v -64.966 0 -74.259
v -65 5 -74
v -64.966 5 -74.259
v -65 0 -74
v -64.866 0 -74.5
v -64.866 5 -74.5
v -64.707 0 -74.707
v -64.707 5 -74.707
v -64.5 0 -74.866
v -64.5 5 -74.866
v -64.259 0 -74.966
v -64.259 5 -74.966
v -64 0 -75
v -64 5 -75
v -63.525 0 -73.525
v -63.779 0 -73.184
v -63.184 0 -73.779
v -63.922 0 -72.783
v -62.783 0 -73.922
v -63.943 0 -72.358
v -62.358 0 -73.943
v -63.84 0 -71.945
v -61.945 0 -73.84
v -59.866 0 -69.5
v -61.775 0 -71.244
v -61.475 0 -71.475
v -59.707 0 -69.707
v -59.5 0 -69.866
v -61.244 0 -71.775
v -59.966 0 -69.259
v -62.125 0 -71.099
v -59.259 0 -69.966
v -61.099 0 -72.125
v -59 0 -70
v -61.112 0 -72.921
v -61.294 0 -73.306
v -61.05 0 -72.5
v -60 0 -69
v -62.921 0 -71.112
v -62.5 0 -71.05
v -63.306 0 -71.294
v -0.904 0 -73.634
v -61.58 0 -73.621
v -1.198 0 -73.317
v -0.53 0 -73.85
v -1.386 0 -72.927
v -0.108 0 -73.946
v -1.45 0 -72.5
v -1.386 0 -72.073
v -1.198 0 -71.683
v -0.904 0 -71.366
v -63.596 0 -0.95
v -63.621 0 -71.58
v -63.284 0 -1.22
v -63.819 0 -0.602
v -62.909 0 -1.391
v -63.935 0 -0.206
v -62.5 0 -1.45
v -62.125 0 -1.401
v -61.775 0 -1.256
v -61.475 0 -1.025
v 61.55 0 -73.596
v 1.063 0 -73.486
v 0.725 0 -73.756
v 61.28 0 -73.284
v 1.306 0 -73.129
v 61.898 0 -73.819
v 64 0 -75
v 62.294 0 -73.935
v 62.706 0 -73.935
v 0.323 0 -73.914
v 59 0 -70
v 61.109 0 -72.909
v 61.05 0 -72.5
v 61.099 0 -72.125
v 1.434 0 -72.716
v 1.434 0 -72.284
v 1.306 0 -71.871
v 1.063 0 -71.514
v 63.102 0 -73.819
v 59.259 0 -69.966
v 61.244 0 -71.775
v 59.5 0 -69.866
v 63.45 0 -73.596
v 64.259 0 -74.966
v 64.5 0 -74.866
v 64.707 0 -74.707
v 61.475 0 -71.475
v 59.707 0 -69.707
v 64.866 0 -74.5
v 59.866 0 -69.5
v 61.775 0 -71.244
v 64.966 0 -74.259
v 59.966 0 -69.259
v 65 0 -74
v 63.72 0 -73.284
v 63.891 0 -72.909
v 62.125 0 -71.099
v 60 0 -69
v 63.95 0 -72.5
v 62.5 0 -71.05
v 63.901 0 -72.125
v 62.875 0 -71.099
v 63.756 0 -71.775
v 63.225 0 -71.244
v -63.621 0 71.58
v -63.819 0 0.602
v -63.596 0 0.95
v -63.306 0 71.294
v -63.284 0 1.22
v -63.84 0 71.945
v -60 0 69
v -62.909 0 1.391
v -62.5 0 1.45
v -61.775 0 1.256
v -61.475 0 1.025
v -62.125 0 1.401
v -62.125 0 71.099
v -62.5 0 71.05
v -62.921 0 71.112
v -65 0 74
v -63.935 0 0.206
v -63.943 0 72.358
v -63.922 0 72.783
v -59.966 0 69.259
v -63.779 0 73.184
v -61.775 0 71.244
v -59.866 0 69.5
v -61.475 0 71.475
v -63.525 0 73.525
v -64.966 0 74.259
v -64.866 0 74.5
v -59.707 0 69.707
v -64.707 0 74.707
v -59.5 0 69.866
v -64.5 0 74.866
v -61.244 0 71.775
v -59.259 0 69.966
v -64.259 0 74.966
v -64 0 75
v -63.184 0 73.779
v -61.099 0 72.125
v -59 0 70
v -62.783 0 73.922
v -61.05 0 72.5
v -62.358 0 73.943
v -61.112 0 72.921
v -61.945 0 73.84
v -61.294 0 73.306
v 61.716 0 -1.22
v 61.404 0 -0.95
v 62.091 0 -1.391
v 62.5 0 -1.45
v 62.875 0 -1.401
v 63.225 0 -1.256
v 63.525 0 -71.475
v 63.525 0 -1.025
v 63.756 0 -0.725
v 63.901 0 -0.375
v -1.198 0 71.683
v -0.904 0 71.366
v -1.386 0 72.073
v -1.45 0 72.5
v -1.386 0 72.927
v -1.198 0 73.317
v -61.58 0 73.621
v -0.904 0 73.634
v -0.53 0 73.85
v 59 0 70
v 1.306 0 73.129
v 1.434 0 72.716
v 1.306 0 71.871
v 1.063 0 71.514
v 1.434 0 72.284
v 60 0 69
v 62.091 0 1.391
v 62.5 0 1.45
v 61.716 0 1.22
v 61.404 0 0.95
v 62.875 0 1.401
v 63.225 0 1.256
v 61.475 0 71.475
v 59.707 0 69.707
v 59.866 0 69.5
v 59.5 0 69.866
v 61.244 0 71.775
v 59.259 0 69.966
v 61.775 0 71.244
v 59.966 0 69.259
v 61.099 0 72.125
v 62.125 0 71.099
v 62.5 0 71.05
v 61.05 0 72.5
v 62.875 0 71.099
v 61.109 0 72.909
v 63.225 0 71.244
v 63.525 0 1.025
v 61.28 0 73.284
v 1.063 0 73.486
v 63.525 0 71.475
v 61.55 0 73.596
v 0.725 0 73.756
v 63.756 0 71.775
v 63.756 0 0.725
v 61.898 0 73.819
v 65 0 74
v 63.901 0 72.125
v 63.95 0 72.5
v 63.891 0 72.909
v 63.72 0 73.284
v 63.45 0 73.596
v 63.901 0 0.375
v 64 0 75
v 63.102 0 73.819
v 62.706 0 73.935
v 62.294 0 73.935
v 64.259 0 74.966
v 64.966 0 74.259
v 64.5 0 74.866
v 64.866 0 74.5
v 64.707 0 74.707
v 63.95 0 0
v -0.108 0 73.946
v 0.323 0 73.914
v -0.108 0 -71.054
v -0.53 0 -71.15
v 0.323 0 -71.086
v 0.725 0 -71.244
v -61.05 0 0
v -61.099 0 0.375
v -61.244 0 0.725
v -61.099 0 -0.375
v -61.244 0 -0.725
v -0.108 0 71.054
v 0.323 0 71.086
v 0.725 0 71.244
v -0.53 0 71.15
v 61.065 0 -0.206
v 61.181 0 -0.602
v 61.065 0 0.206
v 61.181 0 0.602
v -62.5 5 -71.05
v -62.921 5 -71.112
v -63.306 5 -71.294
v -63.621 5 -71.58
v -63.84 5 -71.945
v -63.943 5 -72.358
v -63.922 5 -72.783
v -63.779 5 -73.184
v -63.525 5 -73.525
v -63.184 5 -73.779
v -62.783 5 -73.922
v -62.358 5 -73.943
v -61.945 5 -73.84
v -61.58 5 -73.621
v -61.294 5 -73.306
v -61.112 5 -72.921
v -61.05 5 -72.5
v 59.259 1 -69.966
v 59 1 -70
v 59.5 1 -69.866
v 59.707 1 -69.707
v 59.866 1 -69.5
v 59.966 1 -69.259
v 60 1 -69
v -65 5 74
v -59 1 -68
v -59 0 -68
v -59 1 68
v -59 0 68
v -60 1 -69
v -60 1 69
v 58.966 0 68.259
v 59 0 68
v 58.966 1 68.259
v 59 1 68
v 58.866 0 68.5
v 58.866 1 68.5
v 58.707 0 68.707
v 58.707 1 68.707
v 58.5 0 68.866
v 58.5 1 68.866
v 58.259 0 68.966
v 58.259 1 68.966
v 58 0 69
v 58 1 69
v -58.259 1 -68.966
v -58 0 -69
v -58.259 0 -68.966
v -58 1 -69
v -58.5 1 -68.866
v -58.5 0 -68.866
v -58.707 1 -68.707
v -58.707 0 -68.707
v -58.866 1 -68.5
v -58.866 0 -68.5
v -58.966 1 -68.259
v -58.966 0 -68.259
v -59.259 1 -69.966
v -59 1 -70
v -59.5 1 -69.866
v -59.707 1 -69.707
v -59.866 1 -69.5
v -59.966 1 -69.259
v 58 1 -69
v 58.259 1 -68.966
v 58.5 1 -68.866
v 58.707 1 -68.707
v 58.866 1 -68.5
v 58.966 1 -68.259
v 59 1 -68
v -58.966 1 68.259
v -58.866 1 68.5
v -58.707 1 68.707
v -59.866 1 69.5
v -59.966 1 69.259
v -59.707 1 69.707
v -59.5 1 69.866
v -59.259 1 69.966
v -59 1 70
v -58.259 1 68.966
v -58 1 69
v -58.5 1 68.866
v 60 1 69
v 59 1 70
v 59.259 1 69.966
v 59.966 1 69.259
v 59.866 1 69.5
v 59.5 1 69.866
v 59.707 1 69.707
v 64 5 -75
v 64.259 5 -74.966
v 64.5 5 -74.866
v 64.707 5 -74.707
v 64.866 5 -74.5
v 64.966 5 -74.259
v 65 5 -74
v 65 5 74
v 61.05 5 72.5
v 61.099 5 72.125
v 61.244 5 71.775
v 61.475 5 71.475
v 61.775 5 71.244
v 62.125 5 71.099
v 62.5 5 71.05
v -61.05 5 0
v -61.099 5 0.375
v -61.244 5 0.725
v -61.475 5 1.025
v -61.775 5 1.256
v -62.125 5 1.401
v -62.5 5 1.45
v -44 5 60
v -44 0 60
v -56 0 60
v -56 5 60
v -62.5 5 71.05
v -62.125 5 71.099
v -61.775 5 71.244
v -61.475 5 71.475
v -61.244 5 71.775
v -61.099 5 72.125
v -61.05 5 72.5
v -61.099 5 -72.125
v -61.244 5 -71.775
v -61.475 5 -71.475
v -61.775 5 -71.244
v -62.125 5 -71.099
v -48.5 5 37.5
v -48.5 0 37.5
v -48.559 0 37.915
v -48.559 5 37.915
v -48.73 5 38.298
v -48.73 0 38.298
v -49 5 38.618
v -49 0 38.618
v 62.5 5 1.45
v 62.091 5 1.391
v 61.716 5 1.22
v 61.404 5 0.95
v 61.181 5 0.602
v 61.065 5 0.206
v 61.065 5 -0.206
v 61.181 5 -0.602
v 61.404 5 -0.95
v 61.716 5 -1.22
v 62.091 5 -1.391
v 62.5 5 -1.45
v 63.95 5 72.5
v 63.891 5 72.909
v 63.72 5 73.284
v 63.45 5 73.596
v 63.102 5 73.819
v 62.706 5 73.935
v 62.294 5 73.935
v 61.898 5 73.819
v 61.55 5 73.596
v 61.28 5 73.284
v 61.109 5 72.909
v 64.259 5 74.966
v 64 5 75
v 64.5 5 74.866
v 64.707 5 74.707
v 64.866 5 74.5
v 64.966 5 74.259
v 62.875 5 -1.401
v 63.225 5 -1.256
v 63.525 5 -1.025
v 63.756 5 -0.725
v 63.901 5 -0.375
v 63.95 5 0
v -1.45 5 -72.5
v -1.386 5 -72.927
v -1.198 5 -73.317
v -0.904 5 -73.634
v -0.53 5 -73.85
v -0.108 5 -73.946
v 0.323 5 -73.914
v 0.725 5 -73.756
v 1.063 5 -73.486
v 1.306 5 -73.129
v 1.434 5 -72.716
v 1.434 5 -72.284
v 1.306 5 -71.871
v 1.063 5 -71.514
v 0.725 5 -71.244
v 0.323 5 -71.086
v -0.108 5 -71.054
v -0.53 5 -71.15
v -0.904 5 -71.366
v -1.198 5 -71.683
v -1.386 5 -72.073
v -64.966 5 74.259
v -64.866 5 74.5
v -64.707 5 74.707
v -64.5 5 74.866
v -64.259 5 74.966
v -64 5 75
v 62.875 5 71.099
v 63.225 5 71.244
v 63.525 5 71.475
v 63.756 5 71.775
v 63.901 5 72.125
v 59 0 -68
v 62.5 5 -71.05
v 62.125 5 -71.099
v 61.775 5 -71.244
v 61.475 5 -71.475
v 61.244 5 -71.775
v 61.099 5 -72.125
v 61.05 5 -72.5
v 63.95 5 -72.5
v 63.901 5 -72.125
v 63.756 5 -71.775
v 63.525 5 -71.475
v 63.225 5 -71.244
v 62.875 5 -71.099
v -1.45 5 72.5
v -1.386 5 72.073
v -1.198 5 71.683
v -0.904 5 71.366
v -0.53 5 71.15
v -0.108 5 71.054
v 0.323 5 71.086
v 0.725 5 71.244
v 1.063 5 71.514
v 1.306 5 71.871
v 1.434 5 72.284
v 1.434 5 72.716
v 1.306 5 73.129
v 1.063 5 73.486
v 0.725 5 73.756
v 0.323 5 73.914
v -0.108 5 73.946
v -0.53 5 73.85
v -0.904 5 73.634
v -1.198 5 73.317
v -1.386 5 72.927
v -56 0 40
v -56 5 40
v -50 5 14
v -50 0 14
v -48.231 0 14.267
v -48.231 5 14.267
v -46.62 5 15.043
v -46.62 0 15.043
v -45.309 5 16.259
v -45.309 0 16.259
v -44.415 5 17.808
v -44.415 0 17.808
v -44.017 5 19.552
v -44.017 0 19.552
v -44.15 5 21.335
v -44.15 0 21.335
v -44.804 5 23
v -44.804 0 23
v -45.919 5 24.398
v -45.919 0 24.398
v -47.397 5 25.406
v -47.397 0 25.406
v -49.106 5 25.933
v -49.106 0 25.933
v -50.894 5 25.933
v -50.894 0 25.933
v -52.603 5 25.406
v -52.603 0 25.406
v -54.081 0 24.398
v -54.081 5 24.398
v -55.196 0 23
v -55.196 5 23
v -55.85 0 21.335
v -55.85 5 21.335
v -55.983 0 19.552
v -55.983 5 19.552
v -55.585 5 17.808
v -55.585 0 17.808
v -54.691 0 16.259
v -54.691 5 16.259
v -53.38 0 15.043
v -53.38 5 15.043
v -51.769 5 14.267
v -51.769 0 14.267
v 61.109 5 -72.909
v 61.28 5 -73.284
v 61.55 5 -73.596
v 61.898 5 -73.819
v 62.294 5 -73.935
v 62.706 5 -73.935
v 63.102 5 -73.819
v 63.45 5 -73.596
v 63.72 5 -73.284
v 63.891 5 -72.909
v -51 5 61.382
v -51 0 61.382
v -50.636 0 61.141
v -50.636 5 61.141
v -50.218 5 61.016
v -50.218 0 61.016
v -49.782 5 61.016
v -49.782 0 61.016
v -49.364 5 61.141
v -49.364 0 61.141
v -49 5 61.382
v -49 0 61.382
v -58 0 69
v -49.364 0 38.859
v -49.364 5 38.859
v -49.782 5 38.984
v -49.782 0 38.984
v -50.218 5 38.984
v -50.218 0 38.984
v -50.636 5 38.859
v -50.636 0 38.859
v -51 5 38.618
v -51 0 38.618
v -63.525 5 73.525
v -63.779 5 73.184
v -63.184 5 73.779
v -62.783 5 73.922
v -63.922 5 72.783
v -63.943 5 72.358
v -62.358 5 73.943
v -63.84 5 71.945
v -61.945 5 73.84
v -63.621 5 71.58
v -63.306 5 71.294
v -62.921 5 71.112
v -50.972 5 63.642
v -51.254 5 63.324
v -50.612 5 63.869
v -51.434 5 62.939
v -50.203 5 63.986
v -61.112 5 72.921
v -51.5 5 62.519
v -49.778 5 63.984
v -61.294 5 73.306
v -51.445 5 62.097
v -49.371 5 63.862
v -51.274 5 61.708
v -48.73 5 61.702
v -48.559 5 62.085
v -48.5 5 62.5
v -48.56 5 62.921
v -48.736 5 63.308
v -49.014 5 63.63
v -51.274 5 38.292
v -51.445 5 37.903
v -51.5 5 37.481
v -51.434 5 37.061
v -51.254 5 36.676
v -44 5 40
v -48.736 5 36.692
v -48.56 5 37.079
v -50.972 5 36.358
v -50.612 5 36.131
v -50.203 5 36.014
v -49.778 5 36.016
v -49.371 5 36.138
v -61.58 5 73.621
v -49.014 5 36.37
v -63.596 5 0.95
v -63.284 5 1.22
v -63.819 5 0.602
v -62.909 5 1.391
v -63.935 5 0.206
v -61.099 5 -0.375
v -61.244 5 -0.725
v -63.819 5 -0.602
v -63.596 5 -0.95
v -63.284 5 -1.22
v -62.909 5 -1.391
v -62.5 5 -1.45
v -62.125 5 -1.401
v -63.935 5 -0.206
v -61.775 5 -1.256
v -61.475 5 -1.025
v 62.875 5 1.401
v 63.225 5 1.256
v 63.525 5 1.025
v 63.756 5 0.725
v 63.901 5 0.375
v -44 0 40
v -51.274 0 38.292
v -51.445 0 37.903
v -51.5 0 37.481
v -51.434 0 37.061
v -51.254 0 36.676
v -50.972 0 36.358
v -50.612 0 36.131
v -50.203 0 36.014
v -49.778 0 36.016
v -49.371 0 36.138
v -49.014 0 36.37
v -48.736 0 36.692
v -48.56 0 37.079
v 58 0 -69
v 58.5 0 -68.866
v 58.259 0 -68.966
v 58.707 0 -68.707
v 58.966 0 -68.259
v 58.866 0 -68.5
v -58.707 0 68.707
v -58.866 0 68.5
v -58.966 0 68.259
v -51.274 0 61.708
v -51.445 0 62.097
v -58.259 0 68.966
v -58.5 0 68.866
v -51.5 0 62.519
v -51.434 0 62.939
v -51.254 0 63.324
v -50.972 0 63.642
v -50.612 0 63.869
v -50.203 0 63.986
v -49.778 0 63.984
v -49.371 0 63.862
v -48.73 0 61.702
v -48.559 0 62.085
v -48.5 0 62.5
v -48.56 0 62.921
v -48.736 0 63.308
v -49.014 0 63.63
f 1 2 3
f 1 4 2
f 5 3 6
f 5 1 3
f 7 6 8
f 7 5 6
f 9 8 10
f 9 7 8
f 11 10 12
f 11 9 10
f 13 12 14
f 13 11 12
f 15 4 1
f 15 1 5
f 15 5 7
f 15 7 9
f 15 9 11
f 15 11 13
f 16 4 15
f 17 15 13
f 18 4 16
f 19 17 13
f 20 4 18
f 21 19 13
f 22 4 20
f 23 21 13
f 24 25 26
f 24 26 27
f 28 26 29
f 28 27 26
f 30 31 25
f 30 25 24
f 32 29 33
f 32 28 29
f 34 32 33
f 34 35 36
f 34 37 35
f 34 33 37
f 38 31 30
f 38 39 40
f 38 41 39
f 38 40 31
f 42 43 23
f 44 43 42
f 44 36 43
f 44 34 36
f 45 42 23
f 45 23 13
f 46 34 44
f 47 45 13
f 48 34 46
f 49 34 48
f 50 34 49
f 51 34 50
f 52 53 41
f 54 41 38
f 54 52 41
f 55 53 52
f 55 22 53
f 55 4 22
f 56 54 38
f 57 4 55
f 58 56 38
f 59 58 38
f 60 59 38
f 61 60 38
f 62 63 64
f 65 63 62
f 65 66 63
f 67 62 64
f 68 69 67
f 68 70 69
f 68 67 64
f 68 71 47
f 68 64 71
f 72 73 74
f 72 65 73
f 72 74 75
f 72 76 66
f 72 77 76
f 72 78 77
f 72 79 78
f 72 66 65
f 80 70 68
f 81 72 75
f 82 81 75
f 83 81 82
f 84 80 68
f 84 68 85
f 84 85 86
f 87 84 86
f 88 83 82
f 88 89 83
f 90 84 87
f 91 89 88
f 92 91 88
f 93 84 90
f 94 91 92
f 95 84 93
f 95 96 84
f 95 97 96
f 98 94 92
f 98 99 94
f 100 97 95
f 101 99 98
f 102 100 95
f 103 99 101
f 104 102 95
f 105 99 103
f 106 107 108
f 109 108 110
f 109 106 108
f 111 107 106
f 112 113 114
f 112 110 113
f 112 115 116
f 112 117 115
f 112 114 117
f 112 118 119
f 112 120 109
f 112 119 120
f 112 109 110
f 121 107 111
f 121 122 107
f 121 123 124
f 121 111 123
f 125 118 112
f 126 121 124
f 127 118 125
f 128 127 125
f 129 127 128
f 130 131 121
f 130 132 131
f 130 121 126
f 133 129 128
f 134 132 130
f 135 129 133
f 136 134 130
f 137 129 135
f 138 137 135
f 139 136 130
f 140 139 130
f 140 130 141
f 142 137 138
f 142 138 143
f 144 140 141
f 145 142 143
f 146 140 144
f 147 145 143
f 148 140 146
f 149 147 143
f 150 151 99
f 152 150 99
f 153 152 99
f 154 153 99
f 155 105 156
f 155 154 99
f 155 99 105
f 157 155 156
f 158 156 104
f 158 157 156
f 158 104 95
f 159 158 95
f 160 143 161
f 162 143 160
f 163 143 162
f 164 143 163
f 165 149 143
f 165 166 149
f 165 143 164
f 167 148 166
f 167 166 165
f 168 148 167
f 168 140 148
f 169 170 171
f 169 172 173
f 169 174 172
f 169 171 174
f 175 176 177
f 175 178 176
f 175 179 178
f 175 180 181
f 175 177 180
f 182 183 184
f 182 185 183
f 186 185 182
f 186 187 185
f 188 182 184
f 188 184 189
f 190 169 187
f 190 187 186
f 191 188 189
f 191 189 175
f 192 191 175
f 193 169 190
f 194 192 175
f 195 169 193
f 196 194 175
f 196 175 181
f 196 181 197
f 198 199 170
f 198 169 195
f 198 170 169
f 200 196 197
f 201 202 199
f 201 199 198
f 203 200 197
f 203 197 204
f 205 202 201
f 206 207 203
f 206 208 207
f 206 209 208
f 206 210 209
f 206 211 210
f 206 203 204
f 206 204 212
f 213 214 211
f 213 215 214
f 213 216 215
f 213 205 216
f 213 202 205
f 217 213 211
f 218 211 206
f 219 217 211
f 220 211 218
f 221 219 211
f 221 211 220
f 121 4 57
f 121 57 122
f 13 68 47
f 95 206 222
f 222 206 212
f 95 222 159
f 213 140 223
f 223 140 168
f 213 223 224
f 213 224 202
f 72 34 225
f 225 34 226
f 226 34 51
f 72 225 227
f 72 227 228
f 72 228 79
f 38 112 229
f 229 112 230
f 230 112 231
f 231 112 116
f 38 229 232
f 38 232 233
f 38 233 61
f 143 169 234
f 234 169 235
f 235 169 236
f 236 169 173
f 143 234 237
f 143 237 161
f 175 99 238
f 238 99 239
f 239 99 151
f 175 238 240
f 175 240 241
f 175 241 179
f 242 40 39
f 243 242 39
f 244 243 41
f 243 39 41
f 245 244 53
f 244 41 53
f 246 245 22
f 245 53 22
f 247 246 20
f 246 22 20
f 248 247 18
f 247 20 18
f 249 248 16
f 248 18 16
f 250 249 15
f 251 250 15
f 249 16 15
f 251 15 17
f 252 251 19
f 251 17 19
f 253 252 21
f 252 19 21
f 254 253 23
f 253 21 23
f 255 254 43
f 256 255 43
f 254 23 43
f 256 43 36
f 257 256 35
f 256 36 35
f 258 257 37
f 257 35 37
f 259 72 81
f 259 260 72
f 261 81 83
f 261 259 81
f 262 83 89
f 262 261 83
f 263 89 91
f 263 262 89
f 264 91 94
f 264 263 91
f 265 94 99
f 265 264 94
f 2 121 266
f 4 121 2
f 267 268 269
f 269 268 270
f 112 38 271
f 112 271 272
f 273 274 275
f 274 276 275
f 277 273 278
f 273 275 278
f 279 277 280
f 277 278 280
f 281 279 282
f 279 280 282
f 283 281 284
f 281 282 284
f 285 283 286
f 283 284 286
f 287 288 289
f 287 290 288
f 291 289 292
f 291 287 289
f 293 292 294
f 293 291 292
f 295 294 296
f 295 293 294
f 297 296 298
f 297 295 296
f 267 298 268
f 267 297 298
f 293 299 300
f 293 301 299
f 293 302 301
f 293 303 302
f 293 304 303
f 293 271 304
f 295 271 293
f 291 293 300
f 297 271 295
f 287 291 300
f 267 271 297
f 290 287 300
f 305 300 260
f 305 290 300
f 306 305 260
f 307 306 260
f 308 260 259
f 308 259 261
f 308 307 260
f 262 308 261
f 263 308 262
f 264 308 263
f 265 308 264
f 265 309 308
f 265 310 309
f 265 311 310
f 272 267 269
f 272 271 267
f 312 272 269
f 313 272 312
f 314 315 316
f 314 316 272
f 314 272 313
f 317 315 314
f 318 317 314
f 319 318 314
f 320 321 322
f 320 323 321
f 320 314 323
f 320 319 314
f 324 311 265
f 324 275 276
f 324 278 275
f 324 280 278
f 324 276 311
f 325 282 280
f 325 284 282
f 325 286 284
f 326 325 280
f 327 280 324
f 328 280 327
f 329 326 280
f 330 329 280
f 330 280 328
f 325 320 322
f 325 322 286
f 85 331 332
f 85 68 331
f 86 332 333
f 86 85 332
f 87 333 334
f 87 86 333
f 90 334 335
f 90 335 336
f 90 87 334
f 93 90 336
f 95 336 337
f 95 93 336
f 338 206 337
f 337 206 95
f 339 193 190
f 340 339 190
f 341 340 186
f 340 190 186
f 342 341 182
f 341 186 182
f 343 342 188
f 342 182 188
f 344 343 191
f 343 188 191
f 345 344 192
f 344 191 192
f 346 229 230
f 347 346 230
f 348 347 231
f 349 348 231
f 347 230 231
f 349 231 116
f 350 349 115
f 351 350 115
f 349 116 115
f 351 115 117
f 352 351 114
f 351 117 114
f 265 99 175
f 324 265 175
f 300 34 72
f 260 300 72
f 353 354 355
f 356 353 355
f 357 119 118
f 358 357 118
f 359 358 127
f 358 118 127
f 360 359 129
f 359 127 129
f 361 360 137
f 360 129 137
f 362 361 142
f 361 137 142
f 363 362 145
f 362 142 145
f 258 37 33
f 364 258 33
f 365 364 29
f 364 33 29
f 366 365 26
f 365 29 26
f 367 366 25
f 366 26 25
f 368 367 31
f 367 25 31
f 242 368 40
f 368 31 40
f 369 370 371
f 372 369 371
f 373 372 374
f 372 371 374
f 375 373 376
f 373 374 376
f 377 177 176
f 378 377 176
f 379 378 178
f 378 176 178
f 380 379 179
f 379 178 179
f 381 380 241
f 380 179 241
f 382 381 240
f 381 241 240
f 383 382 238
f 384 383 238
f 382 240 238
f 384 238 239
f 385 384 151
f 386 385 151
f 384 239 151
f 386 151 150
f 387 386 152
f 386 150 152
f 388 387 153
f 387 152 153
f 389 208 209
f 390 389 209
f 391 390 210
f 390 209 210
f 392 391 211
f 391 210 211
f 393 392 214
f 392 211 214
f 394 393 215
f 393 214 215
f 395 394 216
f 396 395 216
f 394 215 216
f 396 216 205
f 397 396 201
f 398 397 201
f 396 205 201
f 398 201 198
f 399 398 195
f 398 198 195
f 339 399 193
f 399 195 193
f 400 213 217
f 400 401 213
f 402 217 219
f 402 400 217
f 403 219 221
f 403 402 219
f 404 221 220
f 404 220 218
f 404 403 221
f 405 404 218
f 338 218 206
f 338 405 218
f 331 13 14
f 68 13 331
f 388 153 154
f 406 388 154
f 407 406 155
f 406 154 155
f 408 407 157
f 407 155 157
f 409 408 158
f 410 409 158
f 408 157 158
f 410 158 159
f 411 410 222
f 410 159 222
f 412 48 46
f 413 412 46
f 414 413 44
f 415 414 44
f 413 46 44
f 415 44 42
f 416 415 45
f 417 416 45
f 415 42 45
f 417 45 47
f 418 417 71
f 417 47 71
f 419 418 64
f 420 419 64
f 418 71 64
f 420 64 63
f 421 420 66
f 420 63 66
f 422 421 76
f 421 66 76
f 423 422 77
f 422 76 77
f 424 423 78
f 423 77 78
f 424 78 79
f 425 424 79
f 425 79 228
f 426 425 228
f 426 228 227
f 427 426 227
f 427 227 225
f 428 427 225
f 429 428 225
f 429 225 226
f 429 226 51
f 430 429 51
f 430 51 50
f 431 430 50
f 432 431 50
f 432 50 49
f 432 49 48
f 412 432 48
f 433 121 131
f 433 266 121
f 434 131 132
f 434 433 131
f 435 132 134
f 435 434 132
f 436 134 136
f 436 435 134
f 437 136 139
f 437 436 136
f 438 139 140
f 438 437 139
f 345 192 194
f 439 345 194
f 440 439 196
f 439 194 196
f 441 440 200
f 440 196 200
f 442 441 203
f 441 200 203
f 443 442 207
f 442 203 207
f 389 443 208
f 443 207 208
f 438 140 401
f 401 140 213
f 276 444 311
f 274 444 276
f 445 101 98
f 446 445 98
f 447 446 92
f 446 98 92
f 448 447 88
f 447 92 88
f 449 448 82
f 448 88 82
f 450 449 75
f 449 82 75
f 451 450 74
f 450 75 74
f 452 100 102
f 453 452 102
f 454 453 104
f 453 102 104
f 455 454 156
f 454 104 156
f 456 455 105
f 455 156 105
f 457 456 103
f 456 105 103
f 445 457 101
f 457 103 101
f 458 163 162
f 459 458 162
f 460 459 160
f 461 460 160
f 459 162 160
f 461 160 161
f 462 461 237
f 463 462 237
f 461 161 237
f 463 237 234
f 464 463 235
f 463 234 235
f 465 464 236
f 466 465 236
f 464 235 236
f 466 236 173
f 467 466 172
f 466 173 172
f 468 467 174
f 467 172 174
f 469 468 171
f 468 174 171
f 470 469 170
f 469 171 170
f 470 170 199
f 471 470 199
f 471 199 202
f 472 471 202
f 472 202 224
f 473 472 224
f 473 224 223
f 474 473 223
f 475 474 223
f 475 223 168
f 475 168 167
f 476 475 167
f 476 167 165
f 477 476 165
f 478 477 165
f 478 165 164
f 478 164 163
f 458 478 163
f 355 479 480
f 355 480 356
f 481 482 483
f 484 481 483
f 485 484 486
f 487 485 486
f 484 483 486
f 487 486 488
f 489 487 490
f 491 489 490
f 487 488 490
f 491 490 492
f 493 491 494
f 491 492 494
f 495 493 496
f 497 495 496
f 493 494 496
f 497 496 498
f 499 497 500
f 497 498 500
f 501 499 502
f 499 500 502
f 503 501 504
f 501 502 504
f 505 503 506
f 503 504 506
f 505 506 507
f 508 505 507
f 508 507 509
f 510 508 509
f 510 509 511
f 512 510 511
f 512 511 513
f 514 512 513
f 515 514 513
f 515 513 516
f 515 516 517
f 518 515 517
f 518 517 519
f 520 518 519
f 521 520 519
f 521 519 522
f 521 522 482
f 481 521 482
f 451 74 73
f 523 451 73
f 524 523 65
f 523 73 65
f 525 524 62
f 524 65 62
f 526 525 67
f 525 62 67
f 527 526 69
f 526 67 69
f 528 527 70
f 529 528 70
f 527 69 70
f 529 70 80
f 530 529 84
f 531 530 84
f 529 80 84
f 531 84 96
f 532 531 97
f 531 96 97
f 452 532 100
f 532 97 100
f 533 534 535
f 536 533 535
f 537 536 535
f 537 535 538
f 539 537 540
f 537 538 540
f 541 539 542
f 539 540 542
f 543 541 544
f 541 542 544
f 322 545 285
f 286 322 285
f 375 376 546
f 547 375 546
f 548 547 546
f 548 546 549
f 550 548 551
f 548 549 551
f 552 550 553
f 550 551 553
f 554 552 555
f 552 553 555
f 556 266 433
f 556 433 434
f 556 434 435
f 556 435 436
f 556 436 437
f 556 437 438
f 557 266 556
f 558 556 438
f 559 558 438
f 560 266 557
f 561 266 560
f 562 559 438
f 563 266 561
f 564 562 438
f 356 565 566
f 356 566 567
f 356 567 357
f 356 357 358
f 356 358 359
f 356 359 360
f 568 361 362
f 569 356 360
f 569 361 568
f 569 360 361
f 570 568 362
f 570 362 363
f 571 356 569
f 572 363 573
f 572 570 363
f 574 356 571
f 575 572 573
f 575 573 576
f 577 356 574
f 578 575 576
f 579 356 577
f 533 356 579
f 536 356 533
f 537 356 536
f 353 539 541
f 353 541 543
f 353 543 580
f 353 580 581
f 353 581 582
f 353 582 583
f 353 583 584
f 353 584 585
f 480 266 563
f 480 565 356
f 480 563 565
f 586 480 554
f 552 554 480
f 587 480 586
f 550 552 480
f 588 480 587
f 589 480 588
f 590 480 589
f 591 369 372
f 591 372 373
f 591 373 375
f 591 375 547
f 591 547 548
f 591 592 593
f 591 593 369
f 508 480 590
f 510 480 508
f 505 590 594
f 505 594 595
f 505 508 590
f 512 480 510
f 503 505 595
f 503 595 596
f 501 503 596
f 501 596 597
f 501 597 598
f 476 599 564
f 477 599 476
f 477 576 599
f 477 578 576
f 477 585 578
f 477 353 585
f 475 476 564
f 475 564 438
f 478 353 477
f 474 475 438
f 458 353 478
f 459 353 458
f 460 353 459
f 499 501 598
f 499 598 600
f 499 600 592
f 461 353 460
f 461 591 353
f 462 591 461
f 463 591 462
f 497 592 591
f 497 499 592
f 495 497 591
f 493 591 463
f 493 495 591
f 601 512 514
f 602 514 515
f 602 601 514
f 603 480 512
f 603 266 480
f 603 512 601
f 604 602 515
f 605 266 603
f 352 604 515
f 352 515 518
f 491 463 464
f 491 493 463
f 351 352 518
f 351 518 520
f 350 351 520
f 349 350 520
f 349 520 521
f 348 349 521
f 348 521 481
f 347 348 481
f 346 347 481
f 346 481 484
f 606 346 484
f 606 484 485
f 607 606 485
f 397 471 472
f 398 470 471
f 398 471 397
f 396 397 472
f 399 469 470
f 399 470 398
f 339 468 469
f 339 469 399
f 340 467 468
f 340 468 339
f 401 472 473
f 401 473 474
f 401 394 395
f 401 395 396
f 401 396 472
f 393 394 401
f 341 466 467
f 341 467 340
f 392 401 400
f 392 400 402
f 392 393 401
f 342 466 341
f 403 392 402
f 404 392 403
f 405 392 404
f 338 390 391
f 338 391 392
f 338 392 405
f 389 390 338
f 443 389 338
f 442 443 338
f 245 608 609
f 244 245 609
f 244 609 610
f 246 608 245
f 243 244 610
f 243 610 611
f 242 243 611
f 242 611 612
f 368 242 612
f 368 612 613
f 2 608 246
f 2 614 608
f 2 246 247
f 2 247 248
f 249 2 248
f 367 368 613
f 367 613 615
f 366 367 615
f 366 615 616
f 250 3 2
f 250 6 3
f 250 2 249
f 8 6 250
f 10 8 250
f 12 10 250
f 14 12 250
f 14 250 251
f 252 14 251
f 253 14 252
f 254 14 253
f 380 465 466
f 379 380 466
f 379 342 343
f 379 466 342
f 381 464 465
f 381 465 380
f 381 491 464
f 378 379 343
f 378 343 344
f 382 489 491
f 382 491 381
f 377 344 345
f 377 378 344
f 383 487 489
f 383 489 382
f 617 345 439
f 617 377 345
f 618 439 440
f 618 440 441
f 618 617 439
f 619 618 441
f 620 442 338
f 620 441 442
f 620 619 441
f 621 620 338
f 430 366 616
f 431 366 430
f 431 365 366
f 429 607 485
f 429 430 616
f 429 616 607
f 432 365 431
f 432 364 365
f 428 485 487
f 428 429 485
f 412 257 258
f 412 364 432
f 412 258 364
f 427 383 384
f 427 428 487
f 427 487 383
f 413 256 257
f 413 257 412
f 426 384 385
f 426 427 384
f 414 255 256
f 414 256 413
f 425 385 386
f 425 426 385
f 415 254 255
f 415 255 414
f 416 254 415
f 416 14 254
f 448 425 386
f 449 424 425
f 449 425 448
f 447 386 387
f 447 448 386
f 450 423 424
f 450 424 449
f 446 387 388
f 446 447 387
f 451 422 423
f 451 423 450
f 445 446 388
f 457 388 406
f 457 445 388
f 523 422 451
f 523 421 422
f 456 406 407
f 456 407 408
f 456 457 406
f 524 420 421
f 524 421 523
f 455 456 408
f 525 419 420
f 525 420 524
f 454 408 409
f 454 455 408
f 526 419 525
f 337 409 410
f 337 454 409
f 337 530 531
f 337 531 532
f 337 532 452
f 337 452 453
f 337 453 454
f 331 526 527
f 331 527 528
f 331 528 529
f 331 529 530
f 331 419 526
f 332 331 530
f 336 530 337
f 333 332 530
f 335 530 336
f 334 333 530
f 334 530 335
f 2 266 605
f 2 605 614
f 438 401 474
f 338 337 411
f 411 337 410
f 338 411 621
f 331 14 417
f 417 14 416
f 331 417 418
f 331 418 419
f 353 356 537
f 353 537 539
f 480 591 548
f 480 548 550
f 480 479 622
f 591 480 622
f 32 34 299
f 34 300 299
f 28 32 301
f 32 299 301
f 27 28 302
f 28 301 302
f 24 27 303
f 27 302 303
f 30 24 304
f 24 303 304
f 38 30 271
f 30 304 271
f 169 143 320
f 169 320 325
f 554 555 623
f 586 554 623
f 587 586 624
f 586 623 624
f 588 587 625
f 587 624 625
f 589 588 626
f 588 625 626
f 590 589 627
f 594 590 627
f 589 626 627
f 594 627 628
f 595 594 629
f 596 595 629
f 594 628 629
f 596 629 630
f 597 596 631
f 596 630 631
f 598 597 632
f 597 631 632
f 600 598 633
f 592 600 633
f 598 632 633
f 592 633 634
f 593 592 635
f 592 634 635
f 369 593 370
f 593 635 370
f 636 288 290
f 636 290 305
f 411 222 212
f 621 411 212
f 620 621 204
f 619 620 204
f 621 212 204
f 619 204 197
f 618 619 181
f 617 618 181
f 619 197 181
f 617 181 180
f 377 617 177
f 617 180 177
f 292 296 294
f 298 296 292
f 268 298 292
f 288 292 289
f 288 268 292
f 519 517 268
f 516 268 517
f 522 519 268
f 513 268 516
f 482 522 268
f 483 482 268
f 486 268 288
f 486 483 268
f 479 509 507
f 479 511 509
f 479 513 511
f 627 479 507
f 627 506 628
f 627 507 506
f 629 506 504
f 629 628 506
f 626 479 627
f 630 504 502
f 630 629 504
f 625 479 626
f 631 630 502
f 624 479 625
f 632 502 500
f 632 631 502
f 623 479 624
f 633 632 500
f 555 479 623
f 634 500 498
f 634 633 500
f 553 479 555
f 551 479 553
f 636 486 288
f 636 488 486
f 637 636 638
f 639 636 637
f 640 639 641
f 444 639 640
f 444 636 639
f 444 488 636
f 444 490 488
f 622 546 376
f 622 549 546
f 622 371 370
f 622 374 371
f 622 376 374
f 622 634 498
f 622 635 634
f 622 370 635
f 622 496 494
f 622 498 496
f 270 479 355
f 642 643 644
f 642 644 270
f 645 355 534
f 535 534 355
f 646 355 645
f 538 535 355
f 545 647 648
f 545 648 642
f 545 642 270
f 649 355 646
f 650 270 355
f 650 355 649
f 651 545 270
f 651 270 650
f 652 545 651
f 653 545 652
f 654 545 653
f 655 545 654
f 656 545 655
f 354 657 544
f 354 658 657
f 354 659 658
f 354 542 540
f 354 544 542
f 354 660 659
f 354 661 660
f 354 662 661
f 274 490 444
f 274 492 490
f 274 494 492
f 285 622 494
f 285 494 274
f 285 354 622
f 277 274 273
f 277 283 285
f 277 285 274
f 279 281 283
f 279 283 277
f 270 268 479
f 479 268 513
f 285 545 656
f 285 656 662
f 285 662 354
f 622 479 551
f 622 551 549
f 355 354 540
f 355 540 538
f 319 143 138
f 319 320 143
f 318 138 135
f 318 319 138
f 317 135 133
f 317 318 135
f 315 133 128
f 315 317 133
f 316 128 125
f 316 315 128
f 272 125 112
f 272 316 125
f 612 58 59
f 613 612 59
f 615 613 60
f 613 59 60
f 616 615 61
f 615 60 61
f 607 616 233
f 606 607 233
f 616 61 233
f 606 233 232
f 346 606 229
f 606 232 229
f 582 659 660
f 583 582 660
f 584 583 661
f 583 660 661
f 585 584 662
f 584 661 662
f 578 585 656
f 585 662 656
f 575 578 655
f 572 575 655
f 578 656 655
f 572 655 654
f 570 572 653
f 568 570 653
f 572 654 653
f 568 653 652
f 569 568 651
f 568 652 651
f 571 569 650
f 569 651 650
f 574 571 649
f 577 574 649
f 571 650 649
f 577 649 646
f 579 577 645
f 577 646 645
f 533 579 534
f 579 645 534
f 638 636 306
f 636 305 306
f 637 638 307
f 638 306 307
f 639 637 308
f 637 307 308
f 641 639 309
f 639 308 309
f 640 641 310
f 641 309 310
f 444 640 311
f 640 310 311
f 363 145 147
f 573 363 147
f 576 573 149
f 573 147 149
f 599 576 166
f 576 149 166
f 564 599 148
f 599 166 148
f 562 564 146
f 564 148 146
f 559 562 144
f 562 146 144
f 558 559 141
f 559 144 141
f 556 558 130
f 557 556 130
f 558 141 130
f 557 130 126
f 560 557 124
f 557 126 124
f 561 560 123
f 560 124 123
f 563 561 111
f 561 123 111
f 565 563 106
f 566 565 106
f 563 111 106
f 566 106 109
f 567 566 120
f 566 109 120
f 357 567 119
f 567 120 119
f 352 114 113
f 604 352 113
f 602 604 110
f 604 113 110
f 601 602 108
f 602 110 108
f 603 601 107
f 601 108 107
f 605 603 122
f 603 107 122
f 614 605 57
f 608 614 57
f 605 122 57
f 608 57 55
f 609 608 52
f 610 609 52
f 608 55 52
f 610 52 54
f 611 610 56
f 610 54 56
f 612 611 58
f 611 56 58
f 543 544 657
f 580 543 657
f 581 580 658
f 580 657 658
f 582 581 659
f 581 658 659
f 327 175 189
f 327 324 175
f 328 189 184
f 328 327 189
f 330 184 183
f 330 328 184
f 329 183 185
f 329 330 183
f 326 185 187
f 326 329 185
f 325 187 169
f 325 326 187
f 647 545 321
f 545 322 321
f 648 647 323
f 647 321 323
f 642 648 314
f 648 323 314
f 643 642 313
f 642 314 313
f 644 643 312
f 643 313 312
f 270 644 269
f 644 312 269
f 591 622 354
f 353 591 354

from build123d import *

# Parameters (mm, degrees)
SKETCH1_W           = 130
SKETCH1_H           = 150
SKETCH1_W_2         = 120
SKETCH1_H_2         = 140
BOSS_EXTRUDE1_DEPTH = 140
SKETCH2_W           = 130
SKETCH2_H           = 150
BOSS_EXTRUDE2_DEPTH = 5
CUT_EXTRUDE1_DEPTH  = 12
SKETCH4_W           = 130
SKETCH4_H           = 150
CUT_EXTRUDE2_DEPTH  = 140
SKETCH6_W           = 120
SKETCH6_H           = 140
BOSS_EXTRUDE3_DEPTH = 5
FILLET1_R           = 1
SKETCH7_W           = 120
SKETCH7_H           = 140
SKETCH7_W_2         = 118
SKETCH7_H_2         = 138
CUT_EXTRUDE3_DEPTH  = 1
FILLET2_R           = 1
SKETCH8_W           = 5
SKETCH8_H           = 20
SKETCH8_W_2         = 2
CUT_EXTRUDE4_DEPTH  = 10
SKETCH9_R           = 6
CUT_EXTRUDE5_DEPTH  = 10


with BuildPart() as part:
    # Sketch1 → Boss-Extrude1 (new body)
    with BuildSketch(Plane(origin=(0, 0, 0), x_dir=(1, 0, 0), z_dir=(0, 1, 0))):
        Rectangle(SKETCH1_W, SKETCH1_H)
        Rectangle(SKETCH1_W_2, SKETCH1_H_2, mode=Mode.SUBTRACT)
    extrude(amount=BOSS_EXTRUDE1_DEPTH)

    # Sketch2 → Boss-Extrude2 (add)
    with BuildSketch(Plane(origin=(0, 140, 0), x_dir=(1, 0, 0), z_dir=(0, 1, 0))):
        Rectangle(SKETCH2_W, SKETCH2_H)
    extrude(amount=BOSS_EXTRUDE2_DEPTH)

    # Sketch3 → Cut-Extrude1 (cut)
    with BuildSketch(Plane.XZ):
        with BuildLine():
            ThreePointArc((1.45, -72.5), (0, -71.05), (-1.45, -72.5))
            Line((-1.45, -72.5), (1.45, -72.5))
        make_face()
        with BuildLine():
            Line((1.45, -72.5), (-1.45, -72.5))
            ThreePointArc((-1.45, -72.5), (0, -73.95), (1.45, -72.5))
        make_face()
        with BuildLine():
            ThreePointArc((63.95, -72.5), (63.525304833, -71.474695167), (62.5, -71.05))
            Line((62.5, -71.05), (62.5, -72.5))
            Line((62.5, -72.5), (61.05, -72.5))
            ThreePointArc((61.05, -72.5), (62.5, -73.95), (63.95, -72.5))
        make_face()
        with BuildLine():
            Line((62.5, -72.5), (62.5, -71.05))
            ThreePointArc((62.5, -71.05), (61.474695167, -71.474695167), (61.05, -72.5))
            Line((61.05, -72.5), (62.5, -72.5))
        make_face()
        with BuildLine():
            ThreePointArc((63.95, 0), (63.525304833, 1.025304833), (62.5, 1.45))
            Line((62.5, 1.45), (62.5, -1.45))
            ThreePointArc((62.5, -1.45), (63.525304833, -1.025304833), (63.95, 0))
        make_face()
        with BuildLine():
            Line((62.5, -1.45), (62.5, 1.45))
            ThreePointArc((62.5, 1.45), (61.05, 0), (62.5, -1.45))
        make_face()
        with BuildLine():
            ThreePointArc((63.95, 72.5), (62.5, 73.95), (61.05, 72.5))
            Line((61.05, 72.5), (62.5, 72.5))
            Line((62.5, 72.5), (62.5, 71.05))
            ThreePointArc((62.5, 71.05), (63.525304833, 71.474695167), (63.95, 72.5))
        make_face()
        with BuildLine():
            Line((62.5, 72.5), (61.05, 72.5))
            ThreePointArc((61.05, 72.5), (61.474695167, 71.474695167), (62.5, 71.05))
            Line((62.5, 71.05), (62.5, 72.5))
        make_face()
        with BuildLine():
            ThreePointArc((1.45, 72.5), (0, 73.95), (-1.45, 72.5))
            Line((-1.45, 72.5), (1.45, 72.5))
        make_face()
        with BuildLine():
            Line((1.45, 72.5), (-1.45, 72.5))
            ThreePointArc((-1.45, 72.5), (0, 71.05), (1.45, 72.5))
        make_face()
        with BuildLine():
            Line((-62.5, 71.05), (-62.5, 72.5))
            Line((-62.5, 72.5), (-61.05, 72.5))
            ThreePointArc((-61.05, 72.5), (-63.525304833, 73.525304833), (-62.5, 71.05))
        make_face()
        with BuildLine():
            Line((-61.05, 72.5), (-62.5, 72.5))
            Line((-62.5, 72.5), (-62.5, 71.05))
            ThreePointArc((-62.5, 71.05), (-61.474695167, 71.474695167), (-61.05, 72.5))
        make_face()
        with BuildLine():
            ThreePointArc((-61.05, 0), (-61.474695167, 1.025304833), (-62.5, 1.45))
            Line((-62.5, 1.45), (-62.5, -1.45))
            ThreePointArc((-62.5, -1.45), (-61.474695167, -1.025304833), (-61.05, 0))
        make_face()
        with BuildLine():
            Line((-62.5, -1.45), (-62.5, 1.45))
            ThreePointArc((-62.5, 1.45), (-63.95, 0), (-62.5, -1.45))
        make_face()
        with BuildLine():
            ThreePointArc((-61.05, -72.5), (-61.474695167, -71.474695167), (-62.5, -71.05))
            Line((-62.5, -71.05), (-62.5, -72.5))
            Line((-62.5, -72.5), (-61.05, -72.5))
        make_face()
        with BuildLine():
            Line((-62.5, -72.5), (-62.5, -71.05))
            ThreePointArc((-62.5, -71.05), (-63.525304833, -73.525304833), (-61.05, -72.5))
            Line((-61.05, -72.5), (-62.5, -72.5))
        make_face()
    extrude(amount=-CUT_EXTRUDE1_DEPTH, mode=Mode.SUBTRACT)

    # Sketch4 → Cut-Extrude2 (cut)
    with BuildSketch(Plane(origin=(0, 145, 0), x_dir=(1, 0, 0), z_dir=(0, 1, 0))):
        Rectangle(SKETCH4_W, SKETCH4_H)
    extrude(amount=-CUT_EXTRUDE2_DEPTH, mode=Mode.SUBTRACT)

    # Sketch6 → Boss-Extrude3 (add)
    with BuildSketch(Plane.XZ):
        Rectangle(SKETCH6_W, SKETCH6_H)
    extrude(amount=-BOSS_EXTRUDE3_DEPTH)

    # Fillet1
    fillet1_edges = [part.edges().sort_by_distance(p)[0] for p in [
        (-65, 2.5, -75),
        (65, 2.5, -75),
        (65, 2.5, 75),
        (-65, 2.5, 75),
    ]]
    fillet(fillet1_edges, radius=FILLET1_R)

    # Sketch7 → Cut-Extrude3 (cut)
    with BuildSketch(Plane.XZ):
        Rectangle(SKETCH7_W, SKETCH7_H)
        Rectangle(SKETCH7_W_2, SKETCH7_H_2, mode=Mode.SUBTRACT)
    extrude(amount=-CUT_EXTRUDE3_DEPTH, mode=Mode.SUBTRACT)

    # Fillet2
    fillet2_edges = [part.edges().sort_by_distance(p)[0] for p in [
        (60, 0.5, -70),
        (-60, 0.5, -70),
        (-60, 0.5, 70),
        (59, 0.5, -69),
        (59, 0.5, 69),
        (-59, 0.5, 69),
        (-59, 0.5, -69),
        (60, 0.5, 70),
    ]]
    fillet(fillet2_edges, radius=FILLET2_R)

    # Sketch8 → Cut-Extrude4 (cut)
    with BuildSketch(Plane.XZ):
        with Locations((-53.5, 50)):
            Rectangle(SKETCH8_W, SKETCH8_H)
        with Locations((-50, 50)):
            Rectangle(SKETCH8_W_2, SKETCH8_H)
        with Locations((-46.5, 50)):
            Rectangle(SKETCH8_W, SKETCH8_H)
        with BuildLine():
            Line((-51, 61.381966011), (-51, 62.5))
            Line((-51, 62.5), (-49, 62.5))
            Line((-49, 62.5), (-49, 61.381966011))
            ThreePointArc((-49, 61.381966011), (-48.630693606, 61.887627564), (-48.5, 62.5))
            ThreePointArc((-48.5, 62.5), (-50.612372436, 63.869306394), (-51, 61.381966011))
        make_face()
        with BuildLine():
            Line((-49, 62.5), (-51, 62.5))
            Line((-51, 62.5), (-51, 61.381966011))
            ThreePointArc((-51, 61.381966011), (-50, 61), (-49, 61.381966011))
            Line((-49, 61.381966011), (-49, 62.5))
        make_face()
        with BuildLine():
            ThreePointArc((-49, 38.618033989), (-50, 39), (-51, 38.618033989))
            Line((-51, 38.618033989), (-51, 37.5))
            Line((-51, 37.5), (-49, 37.5))
            Line((-49, 37.5), (-49, 38.618033989))
        make_face()
        with BuildLine():
            Line((-51, 37.5), (-51, 38.618033989))
            ThreePointArc((-51, 38.618033989), (-50.612372436, 36.130693606), (-48.5, 37.5))
            ThreePointArc((-48.5, 37.5), (-48.630693606, 38.112372436), (-49, 38.618033989))
            Line((-49, 38.618033989), (-49, 37.5))
            Line((-49, 37.5), (-51, 37.5))
        make_face()
    extrude(amount=-CUT_EXTRUDE4_DEPTH, mode=Mode.SUBTRACT)

    # Sketch9 → Cut-Extrude5 (cut)
    with BuildSketch(Plane.XZ):
        with Locations(Location((-50, 20, 0), (0, 0, 270))):
            Circle(SKETCH9_R)
    extrude(amount=-CUT_EXTRUDE5_DEPTH, mode=Mode.SUBTRACT)


solid = part.part
